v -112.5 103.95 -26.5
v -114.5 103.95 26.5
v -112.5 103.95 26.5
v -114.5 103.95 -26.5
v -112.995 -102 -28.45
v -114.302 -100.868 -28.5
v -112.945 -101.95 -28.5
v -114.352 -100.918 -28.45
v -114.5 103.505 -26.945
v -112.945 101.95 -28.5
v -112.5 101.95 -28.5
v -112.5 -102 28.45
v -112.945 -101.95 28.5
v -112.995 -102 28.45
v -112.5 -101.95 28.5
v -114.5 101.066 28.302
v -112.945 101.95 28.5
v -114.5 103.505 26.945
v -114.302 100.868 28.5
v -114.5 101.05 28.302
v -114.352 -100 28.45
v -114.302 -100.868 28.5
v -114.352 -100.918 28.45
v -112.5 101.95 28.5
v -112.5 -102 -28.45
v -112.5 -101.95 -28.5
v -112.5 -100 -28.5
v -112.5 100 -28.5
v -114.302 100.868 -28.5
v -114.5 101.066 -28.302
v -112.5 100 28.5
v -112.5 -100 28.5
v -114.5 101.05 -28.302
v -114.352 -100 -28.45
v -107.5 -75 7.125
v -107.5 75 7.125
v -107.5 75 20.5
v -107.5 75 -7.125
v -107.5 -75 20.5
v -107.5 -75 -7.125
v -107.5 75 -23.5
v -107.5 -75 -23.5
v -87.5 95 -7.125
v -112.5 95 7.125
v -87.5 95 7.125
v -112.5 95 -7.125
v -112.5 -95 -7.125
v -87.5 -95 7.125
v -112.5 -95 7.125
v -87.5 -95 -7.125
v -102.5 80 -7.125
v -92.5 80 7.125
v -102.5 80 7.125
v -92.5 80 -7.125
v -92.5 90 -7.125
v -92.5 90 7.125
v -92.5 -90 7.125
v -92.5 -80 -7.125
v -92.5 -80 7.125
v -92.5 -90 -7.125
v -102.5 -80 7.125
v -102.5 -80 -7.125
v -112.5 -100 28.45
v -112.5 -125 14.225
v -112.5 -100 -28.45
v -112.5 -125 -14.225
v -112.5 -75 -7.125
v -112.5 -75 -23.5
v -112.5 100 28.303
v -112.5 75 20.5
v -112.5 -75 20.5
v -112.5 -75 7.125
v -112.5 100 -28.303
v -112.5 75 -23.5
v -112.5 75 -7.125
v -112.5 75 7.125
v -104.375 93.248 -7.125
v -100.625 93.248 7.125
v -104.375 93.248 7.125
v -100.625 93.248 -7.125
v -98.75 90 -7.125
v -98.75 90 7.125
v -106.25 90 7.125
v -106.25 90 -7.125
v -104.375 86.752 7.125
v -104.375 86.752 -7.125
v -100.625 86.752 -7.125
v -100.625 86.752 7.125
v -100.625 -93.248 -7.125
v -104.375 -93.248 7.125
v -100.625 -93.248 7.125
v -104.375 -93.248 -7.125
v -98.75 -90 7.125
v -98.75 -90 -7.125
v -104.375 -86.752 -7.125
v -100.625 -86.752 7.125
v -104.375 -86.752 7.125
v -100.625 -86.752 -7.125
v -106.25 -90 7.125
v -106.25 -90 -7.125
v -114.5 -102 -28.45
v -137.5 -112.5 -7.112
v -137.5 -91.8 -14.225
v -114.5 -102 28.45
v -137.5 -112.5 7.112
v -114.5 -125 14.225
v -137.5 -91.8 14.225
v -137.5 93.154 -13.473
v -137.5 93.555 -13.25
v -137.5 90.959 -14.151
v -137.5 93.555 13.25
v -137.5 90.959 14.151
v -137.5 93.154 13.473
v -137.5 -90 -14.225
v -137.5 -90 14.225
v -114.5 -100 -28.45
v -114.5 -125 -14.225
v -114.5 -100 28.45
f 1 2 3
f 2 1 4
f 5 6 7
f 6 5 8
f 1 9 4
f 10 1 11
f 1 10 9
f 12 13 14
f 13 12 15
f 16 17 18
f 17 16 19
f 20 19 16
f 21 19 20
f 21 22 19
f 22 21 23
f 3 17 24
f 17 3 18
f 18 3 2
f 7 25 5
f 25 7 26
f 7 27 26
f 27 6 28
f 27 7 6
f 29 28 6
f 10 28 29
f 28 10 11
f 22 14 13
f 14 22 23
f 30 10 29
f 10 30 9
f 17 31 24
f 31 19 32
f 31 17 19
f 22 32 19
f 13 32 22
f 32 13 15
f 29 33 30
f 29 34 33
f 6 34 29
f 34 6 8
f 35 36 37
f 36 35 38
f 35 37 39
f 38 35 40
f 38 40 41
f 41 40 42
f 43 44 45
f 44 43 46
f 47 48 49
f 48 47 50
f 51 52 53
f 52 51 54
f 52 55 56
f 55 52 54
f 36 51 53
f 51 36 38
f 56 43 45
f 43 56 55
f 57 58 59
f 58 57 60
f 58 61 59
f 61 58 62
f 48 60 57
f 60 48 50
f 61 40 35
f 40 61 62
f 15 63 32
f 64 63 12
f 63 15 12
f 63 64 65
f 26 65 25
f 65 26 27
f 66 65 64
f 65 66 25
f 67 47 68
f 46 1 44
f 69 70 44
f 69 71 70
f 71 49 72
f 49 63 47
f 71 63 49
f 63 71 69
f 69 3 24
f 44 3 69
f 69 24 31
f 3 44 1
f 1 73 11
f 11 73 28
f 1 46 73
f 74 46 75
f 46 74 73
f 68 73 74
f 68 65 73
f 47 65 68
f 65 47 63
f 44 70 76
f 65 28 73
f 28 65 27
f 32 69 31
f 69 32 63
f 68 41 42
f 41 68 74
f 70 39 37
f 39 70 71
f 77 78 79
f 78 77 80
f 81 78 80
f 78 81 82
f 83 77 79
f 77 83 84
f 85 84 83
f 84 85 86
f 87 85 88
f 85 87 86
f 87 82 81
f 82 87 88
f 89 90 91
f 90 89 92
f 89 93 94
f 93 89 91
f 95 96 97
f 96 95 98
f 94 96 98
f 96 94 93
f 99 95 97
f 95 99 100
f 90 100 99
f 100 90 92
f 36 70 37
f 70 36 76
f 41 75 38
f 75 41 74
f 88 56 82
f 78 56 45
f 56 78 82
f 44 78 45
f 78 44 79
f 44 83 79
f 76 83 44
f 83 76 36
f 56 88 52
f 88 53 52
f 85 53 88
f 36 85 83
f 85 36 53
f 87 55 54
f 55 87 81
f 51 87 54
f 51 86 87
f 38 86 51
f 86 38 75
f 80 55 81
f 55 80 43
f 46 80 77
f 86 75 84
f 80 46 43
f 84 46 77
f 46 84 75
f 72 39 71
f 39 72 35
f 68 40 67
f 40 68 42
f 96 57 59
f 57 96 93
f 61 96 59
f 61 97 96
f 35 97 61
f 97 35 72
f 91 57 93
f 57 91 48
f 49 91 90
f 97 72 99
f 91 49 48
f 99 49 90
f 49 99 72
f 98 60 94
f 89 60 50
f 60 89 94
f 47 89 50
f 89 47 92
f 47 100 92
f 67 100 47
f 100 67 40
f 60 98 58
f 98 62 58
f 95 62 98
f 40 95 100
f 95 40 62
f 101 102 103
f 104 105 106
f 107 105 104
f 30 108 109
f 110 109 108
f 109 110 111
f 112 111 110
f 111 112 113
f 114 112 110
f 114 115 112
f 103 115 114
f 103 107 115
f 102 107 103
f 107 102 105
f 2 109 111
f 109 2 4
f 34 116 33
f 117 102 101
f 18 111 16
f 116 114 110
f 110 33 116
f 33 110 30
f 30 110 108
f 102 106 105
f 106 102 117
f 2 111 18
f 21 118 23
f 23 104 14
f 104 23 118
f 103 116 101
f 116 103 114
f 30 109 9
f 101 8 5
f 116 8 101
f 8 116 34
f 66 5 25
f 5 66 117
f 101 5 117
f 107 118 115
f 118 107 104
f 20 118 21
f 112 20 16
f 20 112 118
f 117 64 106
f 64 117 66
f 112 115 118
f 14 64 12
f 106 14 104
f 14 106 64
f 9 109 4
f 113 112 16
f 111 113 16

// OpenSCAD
// file: frame-left.scad
/*
 * SPDX-FileCopyrightText: © 2023 Brian S. Stephan <bss@incorporeal.org>
 * SPDX-License-Identifier: GPL-3.0-or-later
 */

include <parameters.scad>
include <components.scad>

module base_left_frame(lower=false) {
	difference() {
		frame(lower=lower);
		// chop the right edge off
		side_chopper();
	}
}

module left_frame(lower=false) {
	difference() {
		base_left_frame(lower=lower);
		// connection holes to other frames
		frame_connection_holes();

		// cable routing hole
		frame_cable_routing_hole();

		// aux button holes
		translate([-35, 101.5, 0]) rotate([270, 0, 0]) aux_control_three_button_cluster();
		translate([-35, (frame_y/2)-neutrik_panel_thickness-4, 0]) frame_cutout();
		translate([-72, (frame_y/2)-neutrik_panel_thickness-4, 0]) frame_cutout();
		translate([2, (frame_y/2)-neutrik_panel_thickness-4, 0]) frame_cutout();

		// neutrix button hole
		translate([frame_center_to_neutrik, (frame_y/2)-neutrik_panel_thickness, 0])
			rotate([90, 0, 0]) neutrik_d_mount();
		translate([frame_center_to_neutrik, (frame_y/2)-neutrik_panel_thickness-4, 0])
			frame_cutout();
	}
}

left_frame();
// file: frame-piece-top-left-or-right.scad
/*
 * SPDX-FileCopyrightText: © 2024 Brian S. Stephan <bss@incorporeal.org>
 * SPDX-License-Identifier: GPL-3.0-or-later
 */

include <parameters.scad>
include <components.scad>
use <frame-left.scad>

module top_left_or_right_frame_piece() {
    piece_width = panel_support_width+frame_wall+frame_mount_column_width;

	intersection() {
		left_frame();
		difference() {
			// include the whole top wall (including mount columns)
			translate([0, (frame_y/2)-(piece_width/2), 0]) cube([frame_x, piece_width, frame_z], center=true);
			// ...minus the frame wall and lip on the left
			translate([-frame_x/2+frame_wall/2, 0, 0])
				cube([frame_wall, frame_y, frame_z], center=true);
			// ...minus a slot for the combining piece to go into
			cube([frame_x, frame_y-(panel_support_width+frame_wall)*2, frame_z/4], center=true);
		}
	}
}

top_left_or_right_frame_piece();
// file: frame-piece-bottom-left-or-right.scad
/*
 * SPDX-FileCopyrightText: © 2024 Brian S. Stephan <bss@incorporeal.org>
 * SPDX-License-Identifier: GPL-3.0-or-later
 */

include <parameters.scad>
include <components.scad>
use <frame-left.scad>

module bottom_left_or_right_frame_piece(lower=false) {
	piece_width = panel_support_width+frame_wall+frame_mount_column_width;
	intersection() {
		left_frame(lower=lower);
		difference() {
			// include the whole bottom wall (including mount columns)
			translate([0, -(frame_y/2)+(piece_width/2), 0]) cube([frame_x, piece_width, frame_z], center=true);
			// ...minus the frame wall and lip on the left
			translate([-frame_x/2+frame_wall/2, 0, 0])
				cube([frame_wall, frame_y, frame_z], center=true);
			// ...minus a slot for the combining piece to go into
			cube([frame_x, frame_y-(panel_support_width+frame_wall)*2, frame_z/4], center=true);
		}
	}
}

bottom_left_or_right_frame_piece();
// file: frame-piece-side.scad
/*
 * SPDX-FileCopyrightText: © 2024 Brian S. Stephan <bss@incorporeal.org>
 * SPDX-License-Identifier: GPL-3.0-or-later
 */

include <parameters.scad>
include <components.scad>
use <frame-piece-top-left-or-right.scad>
use <frame-piece-bottom-left-or-right.scad>

module side_frame_piece(lower=false) {
	piece_width = panel_support_width+frame_wall+frame_mount_column_width;
	difference() {
		// side piece is left/right agnostic
        frame(lower=lower);
		// minus the top and bottom
		top_left_or_right_frame_piece();
		bottom_left_or_right_frame_piece();
		// and just chop out the rest of the frame
		translate([piece_width, 0, 0]) cube([frame_x, frame_y+1, frame_z+1], center=true);
	}
}

side_frame_piece();
// file: frame-piece-bottom-left-or-right-extended.scad
/*
 * SPDX-FileCopyrightText: © 2024 Brian S. Stephan <bss@incorporeal.org>
 * SPDX-License-Identifier: GPL-3.0-or-later
 */

include <parameters.scad>
include <components.scad>
use <frame-piece-bottom-left-or-right.scad>

module bottom_piece_wall(lower=false) {
	// get a slice of the piece, to use it in extruding
	projection(cut=true) rotate([-90, 0, 0]) translate([0, frame_y/2-frame_bevel_height, 0])
		bottom_left_or_right_frame_piece(lower=lower);
}

module bottom_piece_extension(lower=false) {
	// combine the original with a shrunken piece to "pull" the wall out
	hull() {
		linear_extrude(height=frame_extension_y) scale([1, 0.5, 1]) bottom_piece_wall();
		linear_extrude(height=frame_bevel_height) bottom_piece_wall(lower=lower);
	}
}

module extended_bottom_left_or_right_frame_piece(lower=false) {
	bottom_left_or_right_frame_piece(lower=lower);
	translate([0, -frame_y/2+frame_bevel_height*2, 0]) rotate([90, 0, 0]) bottom_piece_extension(lower=lower);
}

extended_bottom_left_or_right_frame_piece();
// file: frame-piece-side-extended-to-bottom.scad
/*
 * SPDX-FileCopyrightText: © 2024 Brian S. Stephan <bss@incorporeal.org>
 * SPDX-License-Identifier: GPL-3.0-or-later
 */

include <parameters.scad>
include <components.scad>
use <frame-piece-bottom-left-or-right-extended.scad>
use <frame-piece-side.scad>

module side_and_bottom_frame_piece_wall(lower=false) {
	// get a slice of the pieces, to use it in extruding
    projection(cut=true) rotate([0, 90, 0]) translate([frame_x/2-frame_bevel_height, 0, 0])
        side_frame_piece(lower=lower);
    projection(cut=true) translate([0, -frame_y/2+frame_wall, 0]) rotate([90, 90, 0]) bottom_piece_extension();
}

module side_and_bottom_frame_piece_extension(lower=false) {
	// combine the original with a shrunken piece to "pull" the wall out
	hull() {
		linear_extrude(height=frame_extension_y) scale([0.5, 0.90, 1]) side_and_bottom_frame_piece_wall(lower=lower);
		linear_extrude(height=frame_bevel_height) side_and_bottom_frame_piece_wall(lower=lower);
	}
}

module extra_extended_left_or_right_frame_piece(lower=false) {
	difference() {
		side_frame_piece(lower=lower);
		// chop off the old edge which is getting replaced with the extension
		translate([-frame_x/2+frame_bevel_height/2, 0, 0]) cube([frame_bevel_height, frame_y, frame_z], center=true);
	}
	translate([-frame_x/2+frame_bevel_height*2, 0, 0]) rotate([0, -90, 0]) side_and_bottom_frame_piece_extension(lower=lower);
}

extra_extended_left_or_right_frame_piece();
// file: parameters.scad
/*
 * SPDX-FileCopyrightText: © 2023 Brian S. Stephan <bss@incorporeal.org>
 * SPDX-License-Identifier: GPL-3.0-or-later
 */

// adjustments
hole_tolerance = 0.15;

// M2
m2_screw_selftap_radius = 0.95;

// M3
m3_screw_selftap_radius = 1.3;

// M4
m4_bolt_radius = 2 + hole_tolerance;
m4_bolt_countersink_radius = 6.1 + hole_tolerance;
m4_bolt_hex_exterior_radius = 3.6 + hole_tolerance;

// 24mm button
small_button_radius = 12 + hole_tolerance;

// 30mm button
big_button_radius = 15 + hole_tolerance;

// JLF mount dimensions
lever_mount_x = 53;
lever_mount_y = 95;
lever_mount_z = 2;

// standard lever hole
lever_plate_hole = 12;

// korean lever hole
korean_lever_plate_hole = 17.6;

// case dimensions
// base frame box. reminder: top of inside (including mounts) is chopped by panel_z for plates
frame_x = 233;
frame_y = 208;
frame_z = 57;

// degree to which the extended frame pieces stick out from the end of the frame
frame_extension_x = 25;
frame_extension_y = 25;

// this sinks the bottom and top of the frame inward a bit, and is used to math out two shapes
// when creating the frame box / overhang panel
frame_bevel_height = 2;
overhang_panel_bevel_height = 1;

frame_center_to_neutrik = 70;

// depth of the "lip" of the frame that the top plate sets into/supports the overhang
frame_wall = 4;

// width of the column in the frame corners to support the hex bolt
frame_mount_column_width = 20;

// per neutrik (mm)
neutrik_panel_thickness = 3;

// top plate, which can either be the whole plate ("inset") or the mounting frame for a plate that overhangs
panel_x = frame_x - (frame_wall * 2);
panel_y = frame_y - (frame_wall * 2);
panel_z = 5;

// how much the top plate x/y is expanded to overhang the frame
// note that this is relative to the top plate (so the wall is added back)
panel_overhang_amount = 8.5;
overhang_panel_x = panel_x + (frame_wall * 2) + (panel_overhang_amount * 2);
overhang_panel_y = panel_y + (frame_wall * 2) + (panel_overhang_amount * 2);

panel_to_frame_point_x = (panel_x/2)-10;
panel_to_frame_point_y = (panel_y/2)-10;

// frame interior that supports the top plates
panel_support_width = 5;

// neutrik D screw holes
neutrik_d_screw_radius = 1.6 + hole_tolerance;
neutrik_d_radius = 12 + hole_tolerance;

// additional button radius for decorative panels, etc.
decorative_radius_scale = 1.75;
jumbo_decorative_radius_scale = 2;
// main file
include <parameters.scad>
include <components.scad>
use <frame-piece-side-extended-to-bottom.scad>

extra_extended_left_or_right_frame_piece(lower=true);
